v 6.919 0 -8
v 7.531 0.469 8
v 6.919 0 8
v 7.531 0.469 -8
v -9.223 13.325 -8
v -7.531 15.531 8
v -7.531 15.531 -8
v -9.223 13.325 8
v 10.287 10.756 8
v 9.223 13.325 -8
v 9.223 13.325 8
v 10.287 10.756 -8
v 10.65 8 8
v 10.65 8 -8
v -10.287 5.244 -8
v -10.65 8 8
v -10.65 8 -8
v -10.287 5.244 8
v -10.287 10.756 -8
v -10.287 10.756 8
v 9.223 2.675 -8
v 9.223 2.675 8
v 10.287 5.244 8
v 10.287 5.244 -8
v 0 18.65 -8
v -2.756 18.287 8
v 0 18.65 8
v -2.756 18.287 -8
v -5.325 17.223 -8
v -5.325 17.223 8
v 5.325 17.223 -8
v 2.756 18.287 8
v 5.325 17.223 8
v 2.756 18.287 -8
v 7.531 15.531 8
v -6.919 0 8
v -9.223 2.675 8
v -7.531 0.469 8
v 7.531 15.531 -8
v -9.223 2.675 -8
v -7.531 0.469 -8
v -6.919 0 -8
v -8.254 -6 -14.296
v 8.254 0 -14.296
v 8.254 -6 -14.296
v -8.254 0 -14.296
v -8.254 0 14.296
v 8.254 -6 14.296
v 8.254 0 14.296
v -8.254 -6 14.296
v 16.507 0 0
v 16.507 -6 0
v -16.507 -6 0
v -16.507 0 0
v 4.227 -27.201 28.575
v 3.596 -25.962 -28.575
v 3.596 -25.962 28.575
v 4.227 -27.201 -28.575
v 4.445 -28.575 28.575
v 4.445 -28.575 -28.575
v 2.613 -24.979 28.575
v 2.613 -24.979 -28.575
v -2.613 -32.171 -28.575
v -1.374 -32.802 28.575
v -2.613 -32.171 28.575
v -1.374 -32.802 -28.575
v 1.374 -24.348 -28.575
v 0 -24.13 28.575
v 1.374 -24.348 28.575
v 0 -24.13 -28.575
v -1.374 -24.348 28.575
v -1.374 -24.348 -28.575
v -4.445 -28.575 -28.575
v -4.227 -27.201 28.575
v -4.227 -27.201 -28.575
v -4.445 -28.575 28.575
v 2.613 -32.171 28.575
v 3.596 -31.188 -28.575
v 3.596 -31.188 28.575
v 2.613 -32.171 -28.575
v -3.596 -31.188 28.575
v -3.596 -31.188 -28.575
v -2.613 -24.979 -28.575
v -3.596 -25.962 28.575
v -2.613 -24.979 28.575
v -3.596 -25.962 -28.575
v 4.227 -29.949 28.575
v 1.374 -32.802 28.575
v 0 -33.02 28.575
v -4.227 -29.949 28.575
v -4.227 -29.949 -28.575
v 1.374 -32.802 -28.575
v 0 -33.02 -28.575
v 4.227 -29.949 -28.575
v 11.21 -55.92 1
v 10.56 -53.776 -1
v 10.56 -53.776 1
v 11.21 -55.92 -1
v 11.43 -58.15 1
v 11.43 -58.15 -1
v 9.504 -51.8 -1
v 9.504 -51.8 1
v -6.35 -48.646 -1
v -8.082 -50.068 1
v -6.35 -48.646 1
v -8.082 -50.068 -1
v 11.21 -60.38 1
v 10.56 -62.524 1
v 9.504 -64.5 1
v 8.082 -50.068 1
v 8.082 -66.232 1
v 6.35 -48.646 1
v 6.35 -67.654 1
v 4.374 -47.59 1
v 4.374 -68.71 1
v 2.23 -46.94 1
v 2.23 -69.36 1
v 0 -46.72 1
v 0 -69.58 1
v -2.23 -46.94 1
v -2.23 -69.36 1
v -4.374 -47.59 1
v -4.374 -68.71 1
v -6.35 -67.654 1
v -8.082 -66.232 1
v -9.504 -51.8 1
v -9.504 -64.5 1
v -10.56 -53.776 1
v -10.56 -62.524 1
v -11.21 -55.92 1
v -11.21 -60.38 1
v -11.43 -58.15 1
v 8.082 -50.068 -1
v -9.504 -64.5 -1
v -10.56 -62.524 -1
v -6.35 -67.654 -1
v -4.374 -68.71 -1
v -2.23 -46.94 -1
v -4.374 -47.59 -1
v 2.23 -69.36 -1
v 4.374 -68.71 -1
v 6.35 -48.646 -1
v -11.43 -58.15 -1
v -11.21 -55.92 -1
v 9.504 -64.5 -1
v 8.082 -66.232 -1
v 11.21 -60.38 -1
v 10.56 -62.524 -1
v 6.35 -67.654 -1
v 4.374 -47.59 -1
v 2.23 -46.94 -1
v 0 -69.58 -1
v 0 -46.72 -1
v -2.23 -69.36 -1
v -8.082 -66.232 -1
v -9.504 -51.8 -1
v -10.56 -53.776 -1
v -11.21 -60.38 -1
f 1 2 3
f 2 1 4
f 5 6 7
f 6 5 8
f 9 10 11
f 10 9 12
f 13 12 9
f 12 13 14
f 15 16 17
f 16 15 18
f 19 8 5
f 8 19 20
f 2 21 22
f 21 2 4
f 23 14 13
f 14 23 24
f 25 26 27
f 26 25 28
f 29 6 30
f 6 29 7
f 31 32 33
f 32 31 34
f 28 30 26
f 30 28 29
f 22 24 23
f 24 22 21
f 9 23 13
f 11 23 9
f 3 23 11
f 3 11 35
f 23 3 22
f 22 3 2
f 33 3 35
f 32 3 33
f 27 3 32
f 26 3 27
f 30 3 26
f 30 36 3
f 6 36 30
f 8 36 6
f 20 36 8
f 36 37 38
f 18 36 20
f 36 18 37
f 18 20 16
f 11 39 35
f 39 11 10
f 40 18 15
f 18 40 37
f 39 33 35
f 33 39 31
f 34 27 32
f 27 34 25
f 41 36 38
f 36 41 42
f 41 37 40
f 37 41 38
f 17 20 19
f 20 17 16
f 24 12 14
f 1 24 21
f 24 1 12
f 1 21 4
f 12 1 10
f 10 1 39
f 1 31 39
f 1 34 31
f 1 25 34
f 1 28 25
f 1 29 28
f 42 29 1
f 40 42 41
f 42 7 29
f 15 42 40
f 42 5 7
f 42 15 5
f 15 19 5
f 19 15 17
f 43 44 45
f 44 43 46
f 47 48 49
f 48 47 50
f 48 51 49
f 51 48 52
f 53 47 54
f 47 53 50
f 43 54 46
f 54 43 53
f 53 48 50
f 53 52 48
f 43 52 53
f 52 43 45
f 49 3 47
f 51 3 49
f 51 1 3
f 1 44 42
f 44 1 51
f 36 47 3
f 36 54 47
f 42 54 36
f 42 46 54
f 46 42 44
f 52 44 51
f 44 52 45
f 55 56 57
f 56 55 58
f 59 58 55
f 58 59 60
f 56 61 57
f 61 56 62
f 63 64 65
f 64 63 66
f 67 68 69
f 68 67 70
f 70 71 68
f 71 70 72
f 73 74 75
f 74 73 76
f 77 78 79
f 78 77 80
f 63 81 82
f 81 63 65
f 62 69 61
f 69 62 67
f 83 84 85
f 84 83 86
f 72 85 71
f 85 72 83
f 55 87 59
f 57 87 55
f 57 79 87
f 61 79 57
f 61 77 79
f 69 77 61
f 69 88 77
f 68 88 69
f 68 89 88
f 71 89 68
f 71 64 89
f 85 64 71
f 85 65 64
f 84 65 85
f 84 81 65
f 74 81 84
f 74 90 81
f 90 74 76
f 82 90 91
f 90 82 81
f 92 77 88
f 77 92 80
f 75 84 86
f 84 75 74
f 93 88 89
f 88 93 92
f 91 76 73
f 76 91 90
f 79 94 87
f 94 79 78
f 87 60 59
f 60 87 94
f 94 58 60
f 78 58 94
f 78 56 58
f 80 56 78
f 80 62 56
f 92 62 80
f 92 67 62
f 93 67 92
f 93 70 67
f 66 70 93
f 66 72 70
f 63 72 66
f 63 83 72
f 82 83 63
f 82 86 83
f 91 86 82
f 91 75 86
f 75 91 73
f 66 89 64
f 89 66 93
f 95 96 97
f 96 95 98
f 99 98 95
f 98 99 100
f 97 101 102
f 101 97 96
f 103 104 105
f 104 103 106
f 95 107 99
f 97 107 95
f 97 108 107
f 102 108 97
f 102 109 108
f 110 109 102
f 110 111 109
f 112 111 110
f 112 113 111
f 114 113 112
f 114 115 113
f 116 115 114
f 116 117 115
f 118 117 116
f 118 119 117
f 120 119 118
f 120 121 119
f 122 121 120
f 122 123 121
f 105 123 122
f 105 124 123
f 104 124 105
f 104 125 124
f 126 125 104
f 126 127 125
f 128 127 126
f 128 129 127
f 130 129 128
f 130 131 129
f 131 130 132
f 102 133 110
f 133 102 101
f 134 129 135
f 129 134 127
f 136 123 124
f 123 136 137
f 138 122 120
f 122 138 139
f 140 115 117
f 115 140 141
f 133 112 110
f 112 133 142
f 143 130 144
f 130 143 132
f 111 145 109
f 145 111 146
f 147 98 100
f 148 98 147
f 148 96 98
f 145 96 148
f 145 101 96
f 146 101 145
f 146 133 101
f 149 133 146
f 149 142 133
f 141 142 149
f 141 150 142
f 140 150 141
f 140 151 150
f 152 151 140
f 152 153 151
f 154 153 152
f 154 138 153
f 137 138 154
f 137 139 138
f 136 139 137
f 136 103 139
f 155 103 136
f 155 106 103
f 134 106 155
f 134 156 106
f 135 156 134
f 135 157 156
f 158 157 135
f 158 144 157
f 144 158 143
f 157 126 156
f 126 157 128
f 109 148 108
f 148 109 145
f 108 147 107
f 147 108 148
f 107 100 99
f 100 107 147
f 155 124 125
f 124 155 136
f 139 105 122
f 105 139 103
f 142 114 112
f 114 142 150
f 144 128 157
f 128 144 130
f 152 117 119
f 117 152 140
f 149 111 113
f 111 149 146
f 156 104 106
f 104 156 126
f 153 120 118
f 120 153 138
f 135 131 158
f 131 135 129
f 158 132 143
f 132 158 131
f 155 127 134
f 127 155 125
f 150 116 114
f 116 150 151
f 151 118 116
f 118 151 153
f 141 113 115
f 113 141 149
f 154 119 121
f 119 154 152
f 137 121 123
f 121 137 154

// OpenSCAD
// Auto-generated by scripts/author_from_manifest.py (Phase D.3).
// Source: data/phase_d_manifest.json (sku_intent='tyco-rfii-pendent-k49-175f').
// Do not hand-edit — regenerate from the manifest.
//
// @part tyco_rfii_pendent_k49_175f
// @kind sprinkler_head
// @category head.pendant.k49
// @display-name "Tyco RFII Residential Pendent K4.9 175°F"
// @mfg tyco_fire_protection
// @mfg-pn RFII
// @listing UL FM
// @hazard-classes LH
// @price-usd 18.50
// @install-minutes 8
// @crew journeyman
// @k-factor 4.9
// @orientation pendant
// @response quick
// @temperature 175F
// @param size_in number default=0.5 label="Size" unit="in"
// @port inlet position=[0,0.014,0] direction=[0,1,0] style=NPT_threaded size_in=0.5 role=drop

size_in = 0.5;
k_factor = 4.9;

length_mm   = 57.15;
body_dia_mm = 25.40;
thread_od   = 21.3;
thread_len  = 16;
deflector_d = body_dia_mm * 0.9;

 union() {
    translate([0, thread_len/2, 0])
        cylinder(h = thread_len, d = thread_od, center = true, $fn = 24);
    translate([0, -3, 0])
        rotate([90, 0, 0])
        cylinder(h = 6, d = thread_od * 1.55, $fn = 6, center = true);
    translate([0, -length_mm/2, 0])
        cylinder(h = length_mm, d = body_dia_mm * 0.35, center = true, $fn = 20);
    translate([0, -length_mm - 1, 0])
        cylinder(h = 2, d = deflector_d, center = true, $fn = 32);
}
